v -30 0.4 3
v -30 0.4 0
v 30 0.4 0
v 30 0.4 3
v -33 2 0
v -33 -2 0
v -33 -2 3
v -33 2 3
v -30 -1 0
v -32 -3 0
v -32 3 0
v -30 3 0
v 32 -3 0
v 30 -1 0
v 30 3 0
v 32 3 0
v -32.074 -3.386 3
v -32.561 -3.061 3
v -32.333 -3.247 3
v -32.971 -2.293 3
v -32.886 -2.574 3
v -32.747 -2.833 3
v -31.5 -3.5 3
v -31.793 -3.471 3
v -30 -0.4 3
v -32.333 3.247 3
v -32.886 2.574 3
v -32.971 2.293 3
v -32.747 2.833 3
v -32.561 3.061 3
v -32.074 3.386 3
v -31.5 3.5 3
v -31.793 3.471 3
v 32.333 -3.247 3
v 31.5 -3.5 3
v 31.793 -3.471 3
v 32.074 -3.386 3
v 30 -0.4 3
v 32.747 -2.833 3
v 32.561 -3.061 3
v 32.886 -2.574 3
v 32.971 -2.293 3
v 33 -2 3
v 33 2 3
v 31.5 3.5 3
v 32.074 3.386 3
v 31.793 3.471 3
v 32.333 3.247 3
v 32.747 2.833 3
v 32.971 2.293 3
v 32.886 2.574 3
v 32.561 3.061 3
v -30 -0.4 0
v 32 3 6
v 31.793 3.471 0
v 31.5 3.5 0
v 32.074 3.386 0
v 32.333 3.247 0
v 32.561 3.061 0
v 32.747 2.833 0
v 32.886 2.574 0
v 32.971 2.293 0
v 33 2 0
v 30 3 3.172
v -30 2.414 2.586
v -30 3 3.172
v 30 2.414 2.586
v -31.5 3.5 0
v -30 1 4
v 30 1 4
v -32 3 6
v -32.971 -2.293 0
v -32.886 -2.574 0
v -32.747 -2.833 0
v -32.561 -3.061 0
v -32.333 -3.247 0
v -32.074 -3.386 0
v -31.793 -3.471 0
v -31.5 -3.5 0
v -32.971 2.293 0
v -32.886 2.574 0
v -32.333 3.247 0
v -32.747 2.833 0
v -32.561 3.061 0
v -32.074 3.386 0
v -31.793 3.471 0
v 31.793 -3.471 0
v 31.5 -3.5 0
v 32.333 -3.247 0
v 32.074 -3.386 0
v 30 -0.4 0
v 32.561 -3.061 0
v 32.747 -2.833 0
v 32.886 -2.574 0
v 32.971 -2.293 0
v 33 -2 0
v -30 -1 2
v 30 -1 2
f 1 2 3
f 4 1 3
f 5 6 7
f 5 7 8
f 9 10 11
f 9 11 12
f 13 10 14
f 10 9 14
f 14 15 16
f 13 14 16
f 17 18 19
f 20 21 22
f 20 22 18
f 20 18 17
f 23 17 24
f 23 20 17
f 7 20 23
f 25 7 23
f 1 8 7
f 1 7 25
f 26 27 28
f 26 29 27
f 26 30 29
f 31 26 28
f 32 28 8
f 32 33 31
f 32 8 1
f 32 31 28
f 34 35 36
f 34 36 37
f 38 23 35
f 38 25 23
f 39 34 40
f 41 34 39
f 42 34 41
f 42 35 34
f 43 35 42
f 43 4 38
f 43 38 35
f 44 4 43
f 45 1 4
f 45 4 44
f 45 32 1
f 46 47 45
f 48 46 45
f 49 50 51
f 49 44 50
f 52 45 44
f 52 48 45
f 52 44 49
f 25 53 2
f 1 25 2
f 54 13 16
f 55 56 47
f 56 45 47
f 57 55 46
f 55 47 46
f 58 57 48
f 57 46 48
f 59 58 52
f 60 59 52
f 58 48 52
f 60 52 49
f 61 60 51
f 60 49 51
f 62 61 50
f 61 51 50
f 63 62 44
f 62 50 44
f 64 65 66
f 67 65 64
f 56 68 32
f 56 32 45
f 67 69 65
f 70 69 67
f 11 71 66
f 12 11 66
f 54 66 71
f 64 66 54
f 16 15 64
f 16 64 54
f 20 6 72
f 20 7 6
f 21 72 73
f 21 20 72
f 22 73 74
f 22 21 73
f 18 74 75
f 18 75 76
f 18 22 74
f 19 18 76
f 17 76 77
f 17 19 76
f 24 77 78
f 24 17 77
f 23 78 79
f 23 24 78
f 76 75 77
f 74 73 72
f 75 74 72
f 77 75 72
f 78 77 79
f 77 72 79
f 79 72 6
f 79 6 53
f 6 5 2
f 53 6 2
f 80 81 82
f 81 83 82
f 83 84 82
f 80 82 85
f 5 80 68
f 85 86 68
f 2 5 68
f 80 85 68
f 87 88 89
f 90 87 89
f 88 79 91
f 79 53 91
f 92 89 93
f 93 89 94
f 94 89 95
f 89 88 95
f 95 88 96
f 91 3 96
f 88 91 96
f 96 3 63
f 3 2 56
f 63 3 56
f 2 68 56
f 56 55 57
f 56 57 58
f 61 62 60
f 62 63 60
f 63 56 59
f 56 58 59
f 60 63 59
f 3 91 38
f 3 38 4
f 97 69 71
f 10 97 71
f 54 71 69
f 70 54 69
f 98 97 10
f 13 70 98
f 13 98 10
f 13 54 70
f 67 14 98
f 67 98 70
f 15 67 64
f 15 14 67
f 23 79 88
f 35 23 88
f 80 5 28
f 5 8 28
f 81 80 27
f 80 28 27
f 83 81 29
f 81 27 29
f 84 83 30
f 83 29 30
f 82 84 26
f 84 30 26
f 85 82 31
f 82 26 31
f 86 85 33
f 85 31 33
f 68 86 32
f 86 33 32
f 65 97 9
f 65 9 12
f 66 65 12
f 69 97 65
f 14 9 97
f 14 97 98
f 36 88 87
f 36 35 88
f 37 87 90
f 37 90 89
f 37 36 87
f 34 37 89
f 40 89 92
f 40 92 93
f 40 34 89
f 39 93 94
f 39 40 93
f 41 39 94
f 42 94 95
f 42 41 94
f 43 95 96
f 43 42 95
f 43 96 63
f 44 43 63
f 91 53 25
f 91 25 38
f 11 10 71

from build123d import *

# Parameters (mm, degrees)
SKETCH_W        = 64
SKETCH_H        = 6
SKETCH_W_2      = 60
SKETCH_H_2      = 2
PAD_DEPTH       = 6
POCKET_DEPTH    = 64.001
SKETCH002_W     = 60
SKETCH002_H     = 2.8284271247
POCKET001_DEPTH = 4.2436406871
SKETCH003_W     = 60
SKETCH003_H     = 0.8284271247
POCKET002_DEPTH = 2.8294271247
SKETCH004_W     = 66
SKETCH004_H     = 7
SKETCH004_W_2   = 60
SKETCH004_H_2   = 0.8
PAD001_DEPTH    = 3
FILLET_R        = 1.5


with BuildPart() as body:
    # Sketch → Pad (new body)
    with BuildSketch(Plane.XY):
        Rectangle(SKETCH_W, SKETCH_H)
        Rectangle(SKETCH_W_2, SKETCH_H_2, mode=Mode.SUBTRACT)
    extrude(amount=PAD_DEPTH)

    # Sketch001 (on Face2 of Pad) → Pocket (cut, through all)
    with BuildSketch(Plane.YZ.offset(32)):
        Polygon((-3, 0), (-3, 6), (3, 6), align=None)
    extrude(amount=-POCKET_DEPTH, mode=Mode.SUBTRACT)

    # Sketch002 (on Face5 of Pocket) → Pocket001 (cut, through all)
    with BuildSketch(Plane(origin=(0, -1.5, 1.5), x_dir=(1, 0, 0), z_dir=(0, -0.7071067812, 0.7071067812))):
        with Locations((0, 2.1213203436)):
            Rectangle(SKETCH002_W, SKETCH002_H)
    extrude(amount=-POCKET001_DEPTH, mode=Mode.SUBTRACT)

    # Sketch003 (on Face3 of Pocket001) → Pocket002 (cut, through all)
    with BuildSketch(Plane(origin=(0, 2.5, 2.5), x_dir=(1, 0, 0), z_dir=(0, -0.7071067812, -0.7071067812))):
        with Locations((0, -0.2928932188)):
            Rectangle(SKETCH003_W, SKETCH003_H)
    extrude(amount=-POCKET002_DEPTH, mode=Mode.SUBTRACT)


with BuildPart() as body001:
    # Sketch004 → Pad001 (new body)
    with BuildSketch(Plane.XY):
        Rectangle(SKETCH004_W, SKETCH004_H)
        Rectangle(SKETCH004_W_2, SKETCH004_H_2, mode=Mode.SUBTRACT)
    extrude(amount=PAD001_DEPTH)

    # Fillet
    fillet_edges = [body001.edges().sort_by_distance(p)[0] for p in [
        (-33, 3.5, 1.5),
        (-33, -3.5, 1.5),
        (33, 3.5, 1.5),
        (33, -3.5, 1.5),
    ]]
    fillet(fillet_edges, radius=FILLET_R)


solid = Compound([body.part, body001.part])
